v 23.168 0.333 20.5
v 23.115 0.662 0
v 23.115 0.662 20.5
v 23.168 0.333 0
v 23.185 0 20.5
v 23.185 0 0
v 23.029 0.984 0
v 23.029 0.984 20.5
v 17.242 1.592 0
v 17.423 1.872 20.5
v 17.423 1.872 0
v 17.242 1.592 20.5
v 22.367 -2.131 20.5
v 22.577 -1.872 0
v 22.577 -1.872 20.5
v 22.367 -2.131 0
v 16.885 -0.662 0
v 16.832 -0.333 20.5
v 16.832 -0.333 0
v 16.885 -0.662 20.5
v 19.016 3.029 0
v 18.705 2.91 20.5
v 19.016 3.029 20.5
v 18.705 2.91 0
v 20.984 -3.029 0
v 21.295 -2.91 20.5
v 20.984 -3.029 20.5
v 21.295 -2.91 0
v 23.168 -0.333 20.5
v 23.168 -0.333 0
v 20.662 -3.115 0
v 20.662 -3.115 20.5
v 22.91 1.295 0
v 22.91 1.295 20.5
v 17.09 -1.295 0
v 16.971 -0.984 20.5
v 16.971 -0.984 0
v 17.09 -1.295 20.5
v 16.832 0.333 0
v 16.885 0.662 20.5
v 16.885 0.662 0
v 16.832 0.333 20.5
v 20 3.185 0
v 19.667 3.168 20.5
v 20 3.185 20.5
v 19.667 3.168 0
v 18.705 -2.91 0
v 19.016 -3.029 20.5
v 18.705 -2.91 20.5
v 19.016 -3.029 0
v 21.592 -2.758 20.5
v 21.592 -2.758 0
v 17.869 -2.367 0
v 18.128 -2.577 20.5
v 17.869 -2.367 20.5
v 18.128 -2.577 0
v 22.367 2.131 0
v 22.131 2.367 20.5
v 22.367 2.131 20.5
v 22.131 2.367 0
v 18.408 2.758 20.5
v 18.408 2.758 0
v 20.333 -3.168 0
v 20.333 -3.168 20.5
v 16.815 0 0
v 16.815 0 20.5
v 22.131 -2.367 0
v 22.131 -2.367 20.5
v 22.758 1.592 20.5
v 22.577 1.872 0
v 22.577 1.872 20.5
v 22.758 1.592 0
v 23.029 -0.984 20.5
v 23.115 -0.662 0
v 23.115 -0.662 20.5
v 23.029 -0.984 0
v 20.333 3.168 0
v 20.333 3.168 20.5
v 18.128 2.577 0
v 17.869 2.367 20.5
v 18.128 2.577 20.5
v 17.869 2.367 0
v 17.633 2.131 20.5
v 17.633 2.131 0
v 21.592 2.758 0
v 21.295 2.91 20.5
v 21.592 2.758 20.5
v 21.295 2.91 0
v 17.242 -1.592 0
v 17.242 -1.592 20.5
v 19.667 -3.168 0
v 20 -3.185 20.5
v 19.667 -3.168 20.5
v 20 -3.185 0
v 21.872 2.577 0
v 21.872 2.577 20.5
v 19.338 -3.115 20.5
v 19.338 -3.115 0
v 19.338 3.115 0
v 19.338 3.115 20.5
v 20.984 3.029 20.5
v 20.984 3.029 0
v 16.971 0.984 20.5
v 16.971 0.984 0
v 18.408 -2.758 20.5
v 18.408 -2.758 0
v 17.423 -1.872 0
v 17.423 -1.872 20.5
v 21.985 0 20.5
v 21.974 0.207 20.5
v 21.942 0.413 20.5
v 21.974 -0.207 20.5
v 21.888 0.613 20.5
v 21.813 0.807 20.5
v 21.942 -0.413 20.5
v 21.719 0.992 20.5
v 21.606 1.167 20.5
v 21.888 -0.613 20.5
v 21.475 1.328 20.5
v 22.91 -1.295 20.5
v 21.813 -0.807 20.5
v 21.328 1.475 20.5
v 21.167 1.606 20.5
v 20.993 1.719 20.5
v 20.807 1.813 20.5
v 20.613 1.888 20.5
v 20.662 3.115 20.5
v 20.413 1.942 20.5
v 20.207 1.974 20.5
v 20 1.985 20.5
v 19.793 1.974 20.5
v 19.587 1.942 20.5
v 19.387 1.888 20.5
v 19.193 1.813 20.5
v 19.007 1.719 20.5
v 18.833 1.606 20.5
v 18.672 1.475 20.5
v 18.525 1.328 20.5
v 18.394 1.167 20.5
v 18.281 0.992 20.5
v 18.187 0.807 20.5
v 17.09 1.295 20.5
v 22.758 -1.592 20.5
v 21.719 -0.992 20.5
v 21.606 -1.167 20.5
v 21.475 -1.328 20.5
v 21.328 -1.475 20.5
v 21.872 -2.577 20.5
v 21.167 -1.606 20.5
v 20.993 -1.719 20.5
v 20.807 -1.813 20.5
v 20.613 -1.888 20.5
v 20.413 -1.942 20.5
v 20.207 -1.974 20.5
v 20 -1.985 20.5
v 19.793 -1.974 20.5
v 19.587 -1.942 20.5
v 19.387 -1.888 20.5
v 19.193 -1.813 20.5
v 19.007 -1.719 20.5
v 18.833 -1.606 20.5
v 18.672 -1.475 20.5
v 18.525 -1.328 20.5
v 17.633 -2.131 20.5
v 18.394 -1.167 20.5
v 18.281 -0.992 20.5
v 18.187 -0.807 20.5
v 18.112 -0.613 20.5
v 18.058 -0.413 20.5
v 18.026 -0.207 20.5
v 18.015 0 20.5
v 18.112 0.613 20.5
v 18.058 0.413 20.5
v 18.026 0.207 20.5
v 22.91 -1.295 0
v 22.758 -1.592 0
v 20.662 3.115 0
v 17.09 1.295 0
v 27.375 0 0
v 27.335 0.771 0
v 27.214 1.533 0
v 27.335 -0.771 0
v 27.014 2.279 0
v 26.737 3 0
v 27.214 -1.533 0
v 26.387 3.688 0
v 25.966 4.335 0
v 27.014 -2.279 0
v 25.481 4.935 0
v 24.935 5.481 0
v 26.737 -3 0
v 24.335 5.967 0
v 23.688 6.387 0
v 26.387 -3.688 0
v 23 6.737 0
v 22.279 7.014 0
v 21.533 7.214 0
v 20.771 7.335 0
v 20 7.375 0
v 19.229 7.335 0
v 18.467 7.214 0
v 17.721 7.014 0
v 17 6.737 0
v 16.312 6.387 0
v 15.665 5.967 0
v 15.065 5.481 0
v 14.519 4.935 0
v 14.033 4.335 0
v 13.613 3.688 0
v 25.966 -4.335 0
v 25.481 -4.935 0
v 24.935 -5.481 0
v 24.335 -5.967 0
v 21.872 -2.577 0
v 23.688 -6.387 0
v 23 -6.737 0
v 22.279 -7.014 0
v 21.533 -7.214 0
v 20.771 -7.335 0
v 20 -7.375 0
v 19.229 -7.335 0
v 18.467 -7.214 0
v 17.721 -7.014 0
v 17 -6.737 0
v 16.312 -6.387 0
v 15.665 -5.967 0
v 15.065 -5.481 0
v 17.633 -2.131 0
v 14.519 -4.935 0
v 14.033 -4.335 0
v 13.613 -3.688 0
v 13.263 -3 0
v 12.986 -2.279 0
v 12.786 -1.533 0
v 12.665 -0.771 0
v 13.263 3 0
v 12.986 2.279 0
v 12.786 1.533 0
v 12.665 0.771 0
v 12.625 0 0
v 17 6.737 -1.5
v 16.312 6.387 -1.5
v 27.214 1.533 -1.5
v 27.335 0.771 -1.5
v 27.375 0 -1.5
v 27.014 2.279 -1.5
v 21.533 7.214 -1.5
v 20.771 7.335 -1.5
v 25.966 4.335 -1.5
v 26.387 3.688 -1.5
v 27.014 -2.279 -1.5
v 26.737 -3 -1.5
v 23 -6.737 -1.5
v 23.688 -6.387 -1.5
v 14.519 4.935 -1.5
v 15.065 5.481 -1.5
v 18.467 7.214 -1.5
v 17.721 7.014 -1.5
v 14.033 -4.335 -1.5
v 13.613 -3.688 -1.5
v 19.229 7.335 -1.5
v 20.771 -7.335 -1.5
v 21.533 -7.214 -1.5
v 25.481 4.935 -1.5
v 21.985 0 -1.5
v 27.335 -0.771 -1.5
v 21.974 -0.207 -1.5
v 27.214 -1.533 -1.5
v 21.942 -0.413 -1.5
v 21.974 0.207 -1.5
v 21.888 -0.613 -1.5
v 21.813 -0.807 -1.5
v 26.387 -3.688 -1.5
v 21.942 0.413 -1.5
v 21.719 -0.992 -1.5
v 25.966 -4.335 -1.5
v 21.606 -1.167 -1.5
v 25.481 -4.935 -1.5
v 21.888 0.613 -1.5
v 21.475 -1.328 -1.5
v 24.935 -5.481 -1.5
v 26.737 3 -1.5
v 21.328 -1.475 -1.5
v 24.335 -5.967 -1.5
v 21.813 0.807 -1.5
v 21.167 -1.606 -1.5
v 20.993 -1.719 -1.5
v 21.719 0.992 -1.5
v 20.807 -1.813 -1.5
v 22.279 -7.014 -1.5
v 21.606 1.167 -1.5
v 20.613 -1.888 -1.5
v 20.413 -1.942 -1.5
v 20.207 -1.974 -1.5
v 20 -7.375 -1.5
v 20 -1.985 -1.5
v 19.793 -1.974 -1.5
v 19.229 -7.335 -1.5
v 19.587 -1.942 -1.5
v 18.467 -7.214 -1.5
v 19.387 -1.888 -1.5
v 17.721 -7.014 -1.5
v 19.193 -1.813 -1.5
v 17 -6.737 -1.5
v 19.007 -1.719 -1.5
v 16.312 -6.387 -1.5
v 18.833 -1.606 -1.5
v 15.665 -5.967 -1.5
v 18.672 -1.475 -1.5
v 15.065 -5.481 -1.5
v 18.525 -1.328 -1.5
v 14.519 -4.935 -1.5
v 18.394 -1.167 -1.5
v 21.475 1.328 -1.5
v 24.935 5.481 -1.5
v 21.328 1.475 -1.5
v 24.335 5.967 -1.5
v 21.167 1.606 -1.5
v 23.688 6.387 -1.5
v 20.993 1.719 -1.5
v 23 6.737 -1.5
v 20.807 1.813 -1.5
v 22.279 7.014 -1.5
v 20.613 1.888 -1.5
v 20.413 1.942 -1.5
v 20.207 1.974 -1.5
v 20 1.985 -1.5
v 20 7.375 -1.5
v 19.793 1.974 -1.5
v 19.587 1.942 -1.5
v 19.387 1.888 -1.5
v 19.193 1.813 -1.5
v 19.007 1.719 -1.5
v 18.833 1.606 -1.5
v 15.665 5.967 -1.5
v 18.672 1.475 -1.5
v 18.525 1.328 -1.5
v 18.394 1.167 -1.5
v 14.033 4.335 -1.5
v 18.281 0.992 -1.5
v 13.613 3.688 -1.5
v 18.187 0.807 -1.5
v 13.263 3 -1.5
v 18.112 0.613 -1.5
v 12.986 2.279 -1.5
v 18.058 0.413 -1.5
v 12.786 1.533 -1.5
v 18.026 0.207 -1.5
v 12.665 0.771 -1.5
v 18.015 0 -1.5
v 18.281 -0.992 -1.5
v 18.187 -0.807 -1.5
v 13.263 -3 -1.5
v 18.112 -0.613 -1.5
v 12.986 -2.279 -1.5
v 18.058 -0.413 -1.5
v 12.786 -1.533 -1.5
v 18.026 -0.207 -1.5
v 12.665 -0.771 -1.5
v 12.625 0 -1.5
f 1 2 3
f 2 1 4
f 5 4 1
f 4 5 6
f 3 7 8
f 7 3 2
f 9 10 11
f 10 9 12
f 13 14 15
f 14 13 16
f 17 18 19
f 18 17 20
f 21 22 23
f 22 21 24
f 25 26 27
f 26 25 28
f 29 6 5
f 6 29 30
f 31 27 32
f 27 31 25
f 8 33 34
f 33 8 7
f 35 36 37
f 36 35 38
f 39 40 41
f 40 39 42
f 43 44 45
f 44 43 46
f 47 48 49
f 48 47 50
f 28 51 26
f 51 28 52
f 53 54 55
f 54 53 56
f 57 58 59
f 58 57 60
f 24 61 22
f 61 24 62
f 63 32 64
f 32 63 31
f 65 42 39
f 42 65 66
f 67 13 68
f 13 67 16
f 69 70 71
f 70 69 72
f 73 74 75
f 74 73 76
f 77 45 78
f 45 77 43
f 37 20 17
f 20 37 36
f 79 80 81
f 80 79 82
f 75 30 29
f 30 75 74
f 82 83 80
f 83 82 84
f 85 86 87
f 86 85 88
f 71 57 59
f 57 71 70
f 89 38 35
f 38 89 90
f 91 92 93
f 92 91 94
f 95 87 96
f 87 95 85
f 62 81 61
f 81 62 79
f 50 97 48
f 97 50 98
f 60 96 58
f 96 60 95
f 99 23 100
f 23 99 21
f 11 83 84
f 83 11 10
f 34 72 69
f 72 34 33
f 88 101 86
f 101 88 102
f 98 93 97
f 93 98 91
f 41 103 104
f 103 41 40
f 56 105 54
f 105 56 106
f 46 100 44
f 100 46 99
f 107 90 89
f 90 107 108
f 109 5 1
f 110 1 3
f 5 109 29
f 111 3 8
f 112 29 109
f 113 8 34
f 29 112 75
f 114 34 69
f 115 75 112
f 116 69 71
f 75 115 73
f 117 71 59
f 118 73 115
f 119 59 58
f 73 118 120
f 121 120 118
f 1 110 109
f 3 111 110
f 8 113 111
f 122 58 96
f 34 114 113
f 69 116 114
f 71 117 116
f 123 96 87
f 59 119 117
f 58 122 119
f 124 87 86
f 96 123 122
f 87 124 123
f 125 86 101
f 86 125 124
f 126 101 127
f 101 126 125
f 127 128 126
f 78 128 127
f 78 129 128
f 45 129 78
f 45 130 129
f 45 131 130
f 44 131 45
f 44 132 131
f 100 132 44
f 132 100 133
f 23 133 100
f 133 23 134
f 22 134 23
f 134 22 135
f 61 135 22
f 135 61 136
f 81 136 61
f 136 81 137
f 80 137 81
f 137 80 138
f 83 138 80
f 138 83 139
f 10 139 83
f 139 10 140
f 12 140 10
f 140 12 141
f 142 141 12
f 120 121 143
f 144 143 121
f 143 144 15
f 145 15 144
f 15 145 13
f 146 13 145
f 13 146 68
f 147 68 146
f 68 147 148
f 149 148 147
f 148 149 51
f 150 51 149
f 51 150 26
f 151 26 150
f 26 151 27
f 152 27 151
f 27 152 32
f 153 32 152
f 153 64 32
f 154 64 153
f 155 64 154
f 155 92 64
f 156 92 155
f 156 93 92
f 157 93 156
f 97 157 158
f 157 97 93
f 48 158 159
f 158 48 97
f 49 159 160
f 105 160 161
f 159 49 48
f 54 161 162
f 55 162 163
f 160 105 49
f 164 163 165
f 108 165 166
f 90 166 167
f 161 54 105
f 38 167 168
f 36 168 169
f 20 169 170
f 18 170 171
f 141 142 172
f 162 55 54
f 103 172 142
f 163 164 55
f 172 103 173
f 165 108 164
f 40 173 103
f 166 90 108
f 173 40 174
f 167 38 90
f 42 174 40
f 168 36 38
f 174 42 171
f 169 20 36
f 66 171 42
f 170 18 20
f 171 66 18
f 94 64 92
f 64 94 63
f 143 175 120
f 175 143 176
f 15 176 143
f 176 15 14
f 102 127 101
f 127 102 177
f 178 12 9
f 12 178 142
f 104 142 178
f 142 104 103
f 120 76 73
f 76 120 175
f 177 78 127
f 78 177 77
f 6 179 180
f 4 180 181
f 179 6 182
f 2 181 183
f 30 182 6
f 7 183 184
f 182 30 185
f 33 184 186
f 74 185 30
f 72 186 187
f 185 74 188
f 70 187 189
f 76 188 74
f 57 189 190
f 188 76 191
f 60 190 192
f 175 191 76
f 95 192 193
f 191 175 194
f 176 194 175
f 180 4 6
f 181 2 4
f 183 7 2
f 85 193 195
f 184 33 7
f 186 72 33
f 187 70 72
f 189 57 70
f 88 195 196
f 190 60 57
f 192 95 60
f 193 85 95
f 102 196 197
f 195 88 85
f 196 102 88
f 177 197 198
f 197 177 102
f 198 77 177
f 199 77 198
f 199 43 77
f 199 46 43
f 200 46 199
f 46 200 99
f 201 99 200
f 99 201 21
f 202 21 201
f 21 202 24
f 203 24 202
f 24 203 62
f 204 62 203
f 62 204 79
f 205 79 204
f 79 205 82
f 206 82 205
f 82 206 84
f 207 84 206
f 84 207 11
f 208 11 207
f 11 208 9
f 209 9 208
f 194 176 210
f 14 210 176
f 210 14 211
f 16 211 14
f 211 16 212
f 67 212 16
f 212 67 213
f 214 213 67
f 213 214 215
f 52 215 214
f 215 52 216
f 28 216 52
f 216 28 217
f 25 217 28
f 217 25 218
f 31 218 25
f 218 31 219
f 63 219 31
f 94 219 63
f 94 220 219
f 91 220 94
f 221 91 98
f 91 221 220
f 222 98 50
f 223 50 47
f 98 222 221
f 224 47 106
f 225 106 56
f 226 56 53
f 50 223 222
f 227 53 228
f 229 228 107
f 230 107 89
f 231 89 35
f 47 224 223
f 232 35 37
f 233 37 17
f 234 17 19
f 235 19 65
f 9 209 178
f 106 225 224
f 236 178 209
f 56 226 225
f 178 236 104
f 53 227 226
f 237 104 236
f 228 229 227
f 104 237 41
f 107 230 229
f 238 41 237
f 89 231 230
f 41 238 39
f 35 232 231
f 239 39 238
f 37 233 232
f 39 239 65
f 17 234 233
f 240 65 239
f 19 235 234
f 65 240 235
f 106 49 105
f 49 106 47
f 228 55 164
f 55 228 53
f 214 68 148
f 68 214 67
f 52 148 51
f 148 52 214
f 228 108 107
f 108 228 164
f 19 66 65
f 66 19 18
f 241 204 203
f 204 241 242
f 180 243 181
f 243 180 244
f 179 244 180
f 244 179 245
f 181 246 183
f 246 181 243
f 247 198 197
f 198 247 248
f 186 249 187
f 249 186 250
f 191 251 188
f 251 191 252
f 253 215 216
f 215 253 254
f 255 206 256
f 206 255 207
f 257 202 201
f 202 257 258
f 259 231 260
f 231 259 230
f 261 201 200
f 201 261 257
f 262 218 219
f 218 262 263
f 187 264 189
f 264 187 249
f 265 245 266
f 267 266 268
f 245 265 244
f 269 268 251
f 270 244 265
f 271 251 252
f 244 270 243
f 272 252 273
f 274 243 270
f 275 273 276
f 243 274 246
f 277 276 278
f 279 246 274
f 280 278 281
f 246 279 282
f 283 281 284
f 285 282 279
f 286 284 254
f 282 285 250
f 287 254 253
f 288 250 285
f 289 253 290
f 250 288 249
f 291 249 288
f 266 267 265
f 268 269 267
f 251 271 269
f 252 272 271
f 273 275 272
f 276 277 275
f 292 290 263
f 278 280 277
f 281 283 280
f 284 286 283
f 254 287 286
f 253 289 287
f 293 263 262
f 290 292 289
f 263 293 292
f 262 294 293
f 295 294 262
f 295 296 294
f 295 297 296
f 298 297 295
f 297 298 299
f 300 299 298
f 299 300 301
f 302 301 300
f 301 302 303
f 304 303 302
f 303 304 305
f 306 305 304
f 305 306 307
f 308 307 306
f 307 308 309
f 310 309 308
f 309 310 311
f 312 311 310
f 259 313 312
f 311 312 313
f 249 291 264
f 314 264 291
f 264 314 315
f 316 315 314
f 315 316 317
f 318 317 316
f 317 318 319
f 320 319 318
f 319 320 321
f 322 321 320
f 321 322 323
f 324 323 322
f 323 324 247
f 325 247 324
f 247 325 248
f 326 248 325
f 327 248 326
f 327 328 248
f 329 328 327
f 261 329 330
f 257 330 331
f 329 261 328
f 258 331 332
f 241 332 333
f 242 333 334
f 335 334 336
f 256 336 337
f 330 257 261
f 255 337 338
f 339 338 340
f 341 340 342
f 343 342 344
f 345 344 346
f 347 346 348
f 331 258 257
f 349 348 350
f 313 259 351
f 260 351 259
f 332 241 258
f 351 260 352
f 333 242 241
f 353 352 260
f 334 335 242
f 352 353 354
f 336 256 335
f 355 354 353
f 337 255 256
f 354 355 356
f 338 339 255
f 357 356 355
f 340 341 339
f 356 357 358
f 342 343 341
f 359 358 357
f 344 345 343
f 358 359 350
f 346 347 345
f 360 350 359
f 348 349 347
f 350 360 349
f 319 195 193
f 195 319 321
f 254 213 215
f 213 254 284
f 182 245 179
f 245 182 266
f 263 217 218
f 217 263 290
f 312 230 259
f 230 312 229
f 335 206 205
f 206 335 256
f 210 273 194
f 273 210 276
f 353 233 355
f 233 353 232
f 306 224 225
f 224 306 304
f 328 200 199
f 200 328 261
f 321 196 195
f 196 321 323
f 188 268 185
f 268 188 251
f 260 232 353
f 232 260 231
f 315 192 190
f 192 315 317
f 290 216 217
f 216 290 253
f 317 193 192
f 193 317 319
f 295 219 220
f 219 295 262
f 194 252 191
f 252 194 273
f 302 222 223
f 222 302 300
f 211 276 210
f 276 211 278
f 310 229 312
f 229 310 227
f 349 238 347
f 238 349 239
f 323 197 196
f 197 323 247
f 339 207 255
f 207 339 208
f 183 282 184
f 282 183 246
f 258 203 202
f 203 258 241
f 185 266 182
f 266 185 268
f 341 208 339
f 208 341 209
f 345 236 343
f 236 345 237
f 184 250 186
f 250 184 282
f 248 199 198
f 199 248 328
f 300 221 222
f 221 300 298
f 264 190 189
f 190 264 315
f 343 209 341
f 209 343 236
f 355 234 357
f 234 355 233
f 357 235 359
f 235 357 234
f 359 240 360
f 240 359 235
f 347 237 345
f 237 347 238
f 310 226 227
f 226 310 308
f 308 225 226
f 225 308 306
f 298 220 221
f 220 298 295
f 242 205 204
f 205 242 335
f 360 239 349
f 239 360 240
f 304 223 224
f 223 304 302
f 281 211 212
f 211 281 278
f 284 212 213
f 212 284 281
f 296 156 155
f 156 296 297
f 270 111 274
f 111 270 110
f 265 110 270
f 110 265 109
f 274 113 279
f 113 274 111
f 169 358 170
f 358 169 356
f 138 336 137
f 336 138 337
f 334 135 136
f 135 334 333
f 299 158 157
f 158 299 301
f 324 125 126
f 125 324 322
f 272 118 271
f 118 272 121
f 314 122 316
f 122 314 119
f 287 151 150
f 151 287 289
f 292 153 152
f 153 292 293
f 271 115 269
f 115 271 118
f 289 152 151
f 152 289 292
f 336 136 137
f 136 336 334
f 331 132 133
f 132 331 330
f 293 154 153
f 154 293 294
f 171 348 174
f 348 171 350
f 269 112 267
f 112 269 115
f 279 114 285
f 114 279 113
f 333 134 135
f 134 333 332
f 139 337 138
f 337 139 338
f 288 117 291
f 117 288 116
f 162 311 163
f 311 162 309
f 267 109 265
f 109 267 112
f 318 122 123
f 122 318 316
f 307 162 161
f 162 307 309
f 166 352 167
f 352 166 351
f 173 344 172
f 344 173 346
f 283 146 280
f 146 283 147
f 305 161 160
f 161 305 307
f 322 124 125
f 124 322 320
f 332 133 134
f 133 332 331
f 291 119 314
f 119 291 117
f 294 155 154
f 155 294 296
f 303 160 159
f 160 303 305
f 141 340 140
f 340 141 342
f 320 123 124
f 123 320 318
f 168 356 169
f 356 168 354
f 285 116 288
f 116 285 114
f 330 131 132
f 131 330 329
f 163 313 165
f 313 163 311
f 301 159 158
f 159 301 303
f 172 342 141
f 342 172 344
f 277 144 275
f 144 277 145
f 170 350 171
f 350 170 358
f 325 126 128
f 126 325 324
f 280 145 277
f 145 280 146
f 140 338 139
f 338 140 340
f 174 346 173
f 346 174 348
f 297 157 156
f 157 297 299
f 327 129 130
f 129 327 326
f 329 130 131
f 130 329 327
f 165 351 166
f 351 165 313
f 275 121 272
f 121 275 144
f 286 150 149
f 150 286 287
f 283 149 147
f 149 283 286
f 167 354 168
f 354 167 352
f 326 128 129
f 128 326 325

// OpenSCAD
$fn=60;

height=19;
thickness=1.2;
diameter=8.75;
expand=3;
expandThickness=1.5;
overlap=0.02;


difference() {
  union() {
    cylinder(h=height,d=diameter);
    translate([0,0,-expandThickness]) cylinder(h=expandThickness,d=diameter+expand*2);
  }
  translate([0,0,-5]) cylinder(h=height+10,d=diameter-thickness*2);
}

!translate([20,0,0]) difference() {
  union() {
    cylinder(h=height+expandThickness,d=diameter-2*thickness+overlap);
    translate([0,0,-expandThickness]) cylinder(h=expandThickness,d=diameter+expand*2);
  }
  translate([0,0,-5]) cylinder(h=height+10,d=diameter-thickness*4+overlap);
}
